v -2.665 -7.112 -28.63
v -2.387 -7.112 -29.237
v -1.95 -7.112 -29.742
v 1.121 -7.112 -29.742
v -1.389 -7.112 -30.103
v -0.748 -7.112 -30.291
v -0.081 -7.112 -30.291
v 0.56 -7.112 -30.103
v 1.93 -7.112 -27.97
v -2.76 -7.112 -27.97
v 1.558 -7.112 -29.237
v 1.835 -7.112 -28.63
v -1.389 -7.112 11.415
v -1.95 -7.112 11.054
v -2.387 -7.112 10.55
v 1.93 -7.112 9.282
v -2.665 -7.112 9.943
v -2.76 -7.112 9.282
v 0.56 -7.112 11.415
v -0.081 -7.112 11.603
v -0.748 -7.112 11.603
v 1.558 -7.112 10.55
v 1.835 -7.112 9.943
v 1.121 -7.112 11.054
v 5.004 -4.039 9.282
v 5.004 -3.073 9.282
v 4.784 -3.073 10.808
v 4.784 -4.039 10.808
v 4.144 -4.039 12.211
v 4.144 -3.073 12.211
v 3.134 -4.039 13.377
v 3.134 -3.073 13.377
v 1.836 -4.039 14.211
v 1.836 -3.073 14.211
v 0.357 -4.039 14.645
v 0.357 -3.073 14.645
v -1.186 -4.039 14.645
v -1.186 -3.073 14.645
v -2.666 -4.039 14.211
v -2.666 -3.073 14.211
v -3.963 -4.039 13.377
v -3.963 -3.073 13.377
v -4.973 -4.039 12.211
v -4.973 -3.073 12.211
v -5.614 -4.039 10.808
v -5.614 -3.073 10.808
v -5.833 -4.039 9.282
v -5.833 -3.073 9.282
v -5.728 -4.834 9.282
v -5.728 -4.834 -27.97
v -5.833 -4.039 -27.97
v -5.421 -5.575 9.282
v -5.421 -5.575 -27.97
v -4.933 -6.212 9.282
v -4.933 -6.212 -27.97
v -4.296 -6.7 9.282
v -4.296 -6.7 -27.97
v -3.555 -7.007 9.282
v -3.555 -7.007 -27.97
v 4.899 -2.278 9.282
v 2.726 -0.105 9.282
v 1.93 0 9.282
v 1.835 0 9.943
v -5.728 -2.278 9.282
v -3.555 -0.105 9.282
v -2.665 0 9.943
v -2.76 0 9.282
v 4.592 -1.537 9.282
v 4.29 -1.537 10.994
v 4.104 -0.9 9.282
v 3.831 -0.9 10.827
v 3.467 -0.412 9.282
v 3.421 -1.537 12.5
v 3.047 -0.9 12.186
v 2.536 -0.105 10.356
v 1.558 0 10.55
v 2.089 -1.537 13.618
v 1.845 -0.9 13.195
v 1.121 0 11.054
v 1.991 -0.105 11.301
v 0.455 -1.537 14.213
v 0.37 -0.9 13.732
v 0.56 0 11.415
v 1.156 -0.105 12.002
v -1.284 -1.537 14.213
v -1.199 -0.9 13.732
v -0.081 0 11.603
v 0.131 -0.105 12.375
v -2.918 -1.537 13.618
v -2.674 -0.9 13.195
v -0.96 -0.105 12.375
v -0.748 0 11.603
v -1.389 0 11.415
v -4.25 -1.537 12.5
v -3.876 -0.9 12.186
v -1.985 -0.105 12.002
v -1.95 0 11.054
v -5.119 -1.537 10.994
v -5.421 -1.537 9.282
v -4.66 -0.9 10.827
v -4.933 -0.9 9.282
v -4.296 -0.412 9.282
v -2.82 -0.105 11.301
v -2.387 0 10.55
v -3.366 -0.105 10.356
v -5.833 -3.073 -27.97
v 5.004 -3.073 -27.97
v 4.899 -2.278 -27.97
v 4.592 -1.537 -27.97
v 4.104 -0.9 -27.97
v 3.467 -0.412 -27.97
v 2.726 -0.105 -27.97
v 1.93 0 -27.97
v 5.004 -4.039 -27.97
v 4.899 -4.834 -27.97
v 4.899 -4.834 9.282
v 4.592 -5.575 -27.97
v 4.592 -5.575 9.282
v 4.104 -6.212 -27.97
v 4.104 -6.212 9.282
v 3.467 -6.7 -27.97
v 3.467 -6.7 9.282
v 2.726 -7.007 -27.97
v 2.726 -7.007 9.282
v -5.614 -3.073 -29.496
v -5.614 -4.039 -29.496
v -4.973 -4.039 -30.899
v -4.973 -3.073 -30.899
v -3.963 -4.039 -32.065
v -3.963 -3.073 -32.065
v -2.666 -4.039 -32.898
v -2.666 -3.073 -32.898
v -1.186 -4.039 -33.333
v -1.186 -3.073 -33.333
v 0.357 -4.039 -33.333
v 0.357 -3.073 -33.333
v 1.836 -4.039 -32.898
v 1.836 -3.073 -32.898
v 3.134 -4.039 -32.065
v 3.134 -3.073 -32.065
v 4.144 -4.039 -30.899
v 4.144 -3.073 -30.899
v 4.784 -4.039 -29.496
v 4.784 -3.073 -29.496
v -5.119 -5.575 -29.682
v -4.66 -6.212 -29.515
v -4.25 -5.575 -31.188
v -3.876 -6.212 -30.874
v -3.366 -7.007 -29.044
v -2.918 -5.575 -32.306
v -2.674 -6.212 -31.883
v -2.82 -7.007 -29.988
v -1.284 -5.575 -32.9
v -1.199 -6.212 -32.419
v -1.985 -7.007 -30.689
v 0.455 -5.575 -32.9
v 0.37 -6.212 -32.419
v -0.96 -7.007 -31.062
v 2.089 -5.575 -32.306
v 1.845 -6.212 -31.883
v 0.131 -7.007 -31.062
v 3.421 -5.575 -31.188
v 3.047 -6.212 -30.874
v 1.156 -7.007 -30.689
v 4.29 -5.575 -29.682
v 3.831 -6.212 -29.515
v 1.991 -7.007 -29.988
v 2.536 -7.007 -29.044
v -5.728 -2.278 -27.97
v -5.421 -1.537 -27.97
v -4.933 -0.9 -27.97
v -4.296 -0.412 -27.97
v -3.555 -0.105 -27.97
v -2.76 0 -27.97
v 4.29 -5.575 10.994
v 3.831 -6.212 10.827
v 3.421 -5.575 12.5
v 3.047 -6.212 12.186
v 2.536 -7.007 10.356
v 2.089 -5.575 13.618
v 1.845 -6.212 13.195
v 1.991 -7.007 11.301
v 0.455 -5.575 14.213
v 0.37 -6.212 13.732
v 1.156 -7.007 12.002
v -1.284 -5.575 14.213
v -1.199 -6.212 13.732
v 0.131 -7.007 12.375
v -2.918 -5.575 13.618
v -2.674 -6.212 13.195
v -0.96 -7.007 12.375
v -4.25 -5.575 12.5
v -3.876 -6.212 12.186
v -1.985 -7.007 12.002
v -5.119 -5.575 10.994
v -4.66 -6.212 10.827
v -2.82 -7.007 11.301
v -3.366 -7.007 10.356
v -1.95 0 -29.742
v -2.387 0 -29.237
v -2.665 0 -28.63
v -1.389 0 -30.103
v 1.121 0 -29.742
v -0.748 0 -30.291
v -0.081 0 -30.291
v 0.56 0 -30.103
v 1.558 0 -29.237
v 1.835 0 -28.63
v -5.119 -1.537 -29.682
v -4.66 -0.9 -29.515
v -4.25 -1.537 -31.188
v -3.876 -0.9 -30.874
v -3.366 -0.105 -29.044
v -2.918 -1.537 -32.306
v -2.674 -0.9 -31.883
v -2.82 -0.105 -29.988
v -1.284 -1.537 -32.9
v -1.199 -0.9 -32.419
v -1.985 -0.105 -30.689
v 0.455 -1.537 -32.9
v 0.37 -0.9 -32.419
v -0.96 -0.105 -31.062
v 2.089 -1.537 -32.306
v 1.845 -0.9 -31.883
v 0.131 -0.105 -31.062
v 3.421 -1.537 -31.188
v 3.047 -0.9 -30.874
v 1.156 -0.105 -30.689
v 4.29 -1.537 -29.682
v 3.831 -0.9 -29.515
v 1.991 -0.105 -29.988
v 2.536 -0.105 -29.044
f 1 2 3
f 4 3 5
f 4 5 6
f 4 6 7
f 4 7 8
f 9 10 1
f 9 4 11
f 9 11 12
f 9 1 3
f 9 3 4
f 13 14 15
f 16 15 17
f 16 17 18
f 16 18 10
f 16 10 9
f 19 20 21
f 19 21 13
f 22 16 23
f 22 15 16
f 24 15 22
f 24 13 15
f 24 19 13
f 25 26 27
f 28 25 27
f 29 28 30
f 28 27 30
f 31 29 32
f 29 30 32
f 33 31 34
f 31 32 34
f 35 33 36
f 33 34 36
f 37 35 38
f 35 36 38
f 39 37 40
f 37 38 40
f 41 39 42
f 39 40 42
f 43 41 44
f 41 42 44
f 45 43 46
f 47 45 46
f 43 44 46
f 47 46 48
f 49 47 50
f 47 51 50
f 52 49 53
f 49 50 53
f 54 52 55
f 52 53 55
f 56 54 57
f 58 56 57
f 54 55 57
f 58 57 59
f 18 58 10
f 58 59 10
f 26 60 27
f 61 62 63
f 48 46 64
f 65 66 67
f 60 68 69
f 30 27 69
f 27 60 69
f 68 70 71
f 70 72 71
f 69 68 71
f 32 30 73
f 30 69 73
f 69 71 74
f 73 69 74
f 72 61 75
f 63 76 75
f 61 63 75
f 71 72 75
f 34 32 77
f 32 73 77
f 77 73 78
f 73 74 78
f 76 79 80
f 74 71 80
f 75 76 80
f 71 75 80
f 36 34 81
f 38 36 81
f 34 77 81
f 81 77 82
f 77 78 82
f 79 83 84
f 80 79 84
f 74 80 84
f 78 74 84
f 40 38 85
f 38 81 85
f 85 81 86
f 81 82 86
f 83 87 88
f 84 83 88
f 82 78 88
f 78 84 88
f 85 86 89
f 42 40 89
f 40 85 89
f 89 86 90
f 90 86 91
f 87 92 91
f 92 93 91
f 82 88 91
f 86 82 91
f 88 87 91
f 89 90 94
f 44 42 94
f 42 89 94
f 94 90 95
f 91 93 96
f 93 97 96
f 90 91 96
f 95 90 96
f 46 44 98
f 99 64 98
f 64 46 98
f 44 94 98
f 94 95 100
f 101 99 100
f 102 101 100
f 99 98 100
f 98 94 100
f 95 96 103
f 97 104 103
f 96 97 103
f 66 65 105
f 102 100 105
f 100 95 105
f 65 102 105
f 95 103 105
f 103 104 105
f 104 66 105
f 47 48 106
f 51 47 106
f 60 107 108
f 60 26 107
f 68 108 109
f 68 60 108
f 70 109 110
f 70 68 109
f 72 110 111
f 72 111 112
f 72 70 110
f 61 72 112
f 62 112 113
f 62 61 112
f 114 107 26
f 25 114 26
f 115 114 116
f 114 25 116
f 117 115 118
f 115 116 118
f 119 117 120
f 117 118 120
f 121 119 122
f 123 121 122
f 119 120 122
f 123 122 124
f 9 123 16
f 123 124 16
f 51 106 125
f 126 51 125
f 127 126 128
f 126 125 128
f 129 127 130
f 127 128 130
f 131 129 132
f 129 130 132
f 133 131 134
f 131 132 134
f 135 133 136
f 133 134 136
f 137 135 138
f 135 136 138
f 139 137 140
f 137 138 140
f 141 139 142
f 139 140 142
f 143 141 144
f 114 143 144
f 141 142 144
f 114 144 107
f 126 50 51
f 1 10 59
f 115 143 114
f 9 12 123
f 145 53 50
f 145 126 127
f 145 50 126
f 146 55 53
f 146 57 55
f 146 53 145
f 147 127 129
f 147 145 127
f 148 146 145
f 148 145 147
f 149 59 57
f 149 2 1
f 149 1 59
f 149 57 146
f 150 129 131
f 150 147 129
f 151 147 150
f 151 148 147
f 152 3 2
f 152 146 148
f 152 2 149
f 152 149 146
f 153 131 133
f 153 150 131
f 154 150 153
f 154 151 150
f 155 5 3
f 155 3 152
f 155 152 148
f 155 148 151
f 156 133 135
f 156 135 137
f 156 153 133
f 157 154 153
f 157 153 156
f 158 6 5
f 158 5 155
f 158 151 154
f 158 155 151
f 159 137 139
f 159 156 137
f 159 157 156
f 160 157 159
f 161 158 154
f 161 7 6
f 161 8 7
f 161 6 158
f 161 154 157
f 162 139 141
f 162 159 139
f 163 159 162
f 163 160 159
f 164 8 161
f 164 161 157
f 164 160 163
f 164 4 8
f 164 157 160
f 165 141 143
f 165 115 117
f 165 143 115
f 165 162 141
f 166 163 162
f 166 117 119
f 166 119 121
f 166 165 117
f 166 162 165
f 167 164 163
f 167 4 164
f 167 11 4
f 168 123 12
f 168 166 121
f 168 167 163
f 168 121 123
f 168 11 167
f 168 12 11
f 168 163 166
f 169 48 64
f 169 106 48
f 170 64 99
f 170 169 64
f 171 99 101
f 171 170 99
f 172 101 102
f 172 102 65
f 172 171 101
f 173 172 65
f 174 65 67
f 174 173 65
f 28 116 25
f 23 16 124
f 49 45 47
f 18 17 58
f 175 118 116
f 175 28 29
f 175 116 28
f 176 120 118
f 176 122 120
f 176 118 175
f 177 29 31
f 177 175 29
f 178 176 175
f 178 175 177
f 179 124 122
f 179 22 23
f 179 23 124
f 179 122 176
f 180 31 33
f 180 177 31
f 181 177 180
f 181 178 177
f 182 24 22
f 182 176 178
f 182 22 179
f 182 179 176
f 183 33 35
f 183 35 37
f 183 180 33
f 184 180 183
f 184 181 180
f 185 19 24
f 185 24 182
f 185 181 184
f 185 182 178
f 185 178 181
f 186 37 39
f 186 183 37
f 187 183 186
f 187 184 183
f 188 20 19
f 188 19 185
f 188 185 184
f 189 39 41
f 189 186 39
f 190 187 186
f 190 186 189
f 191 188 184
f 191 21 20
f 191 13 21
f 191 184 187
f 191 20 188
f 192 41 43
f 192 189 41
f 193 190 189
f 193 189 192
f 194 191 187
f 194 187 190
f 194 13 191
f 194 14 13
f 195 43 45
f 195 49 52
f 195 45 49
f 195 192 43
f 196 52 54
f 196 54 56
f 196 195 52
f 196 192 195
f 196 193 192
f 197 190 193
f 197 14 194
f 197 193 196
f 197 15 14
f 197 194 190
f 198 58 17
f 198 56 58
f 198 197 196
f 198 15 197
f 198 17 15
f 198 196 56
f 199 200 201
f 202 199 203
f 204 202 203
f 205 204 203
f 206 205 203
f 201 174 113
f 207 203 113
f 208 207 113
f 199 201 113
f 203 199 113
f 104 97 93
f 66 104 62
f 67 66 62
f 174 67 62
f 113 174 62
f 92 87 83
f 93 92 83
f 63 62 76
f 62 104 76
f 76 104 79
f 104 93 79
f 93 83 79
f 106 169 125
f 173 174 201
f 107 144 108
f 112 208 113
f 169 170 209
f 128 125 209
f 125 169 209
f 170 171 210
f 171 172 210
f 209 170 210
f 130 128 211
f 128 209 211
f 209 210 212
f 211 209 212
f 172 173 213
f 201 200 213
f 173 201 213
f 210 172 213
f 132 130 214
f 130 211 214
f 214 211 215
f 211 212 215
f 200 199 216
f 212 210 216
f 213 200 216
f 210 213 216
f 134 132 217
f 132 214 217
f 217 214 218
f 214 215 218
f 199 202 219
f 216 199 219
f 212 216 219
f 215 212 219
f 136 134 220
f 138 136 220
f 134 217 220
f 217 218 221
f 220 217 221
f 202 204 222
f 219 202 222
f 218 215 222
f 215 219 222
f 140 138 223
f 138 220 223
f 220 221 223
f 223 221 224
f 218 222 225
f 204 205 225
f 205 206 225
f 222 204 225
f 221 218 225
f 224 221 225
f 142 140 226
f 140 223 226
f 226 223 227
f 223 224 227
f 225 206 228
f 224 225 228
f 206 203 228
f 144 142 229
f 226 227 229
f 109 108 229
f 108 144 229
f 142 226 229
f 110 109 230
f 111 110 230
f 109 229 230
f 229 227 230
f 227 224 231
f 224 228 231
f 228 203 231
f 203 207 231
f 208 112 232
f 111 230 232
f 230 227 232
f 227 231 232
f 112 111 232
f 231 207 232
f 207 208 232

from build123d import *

# Parameters (mm, degrees)
F1_DEPTH = 7.112
F2_R     = 3.0734


with BuildPart() as f1:
    # F0 (on Front) → F1 (new body)
    with BuildSketch(Plane.XZ):
        with BuildLine():
            Line((-5.833062, 5.073665), (-5.833062, -2.089096))
            ThreePointArc((-5.833062, -2.089096), (-0.414611, 3.329354), (5.003839, -2.089096))
            Line((5.003839, -2.089096), (5.003839, 1.10841))
            Line((5.003839, 1.10841), (5.003839, 9.281913))
            ThreePointArc((5.003839, 9.281913), (-0.414611, 14.700363), (-5.833062, 9.281913))
            Line((-5.833062, 9.281913), (-5.833062, 5.073665))
        make_face()
        with BuildLine():
            Line((5.003839, -2.089096), (-5.833062, -2.089096))
            ThreePointArc((-5.833062, -2.089096), (-0.414611, -7.507547), (5.003839, -2.089096))
        make_face()
        with BuildLine():
            ThreePointArc((5.003839, -2.089096), (-0.414611, 3.329354), (-5.833062, -2.089096))
            Line((-5.833062, -2.089096), (5.003839, -2.089096))
        make_face()
        with BuildLine():
            Line((-5.833062, -2.089096), (-5.833062, -27.969601))
            ThreePointArc((-5.833062, -27.969601), (-0.414611, -33.388051), (5.003839, -27.969601))
            Line((5.003839, -27.969601), (5.003839, -9.071903))
            Line((5.003839, -9.071903), (5.003839, -2.089096))
            ThreePointArc((5.003839, -2.089096), (-0.414611, -7.507547), (-5.833062, -2.089096))
        make_face()
    extrude(amount=F1_DEPTH)

    # F2
    f2_edges = [f1.edges().sort_by_distance(p)[0] for p in [
        (5.003839, -7.112, -9.343844),
        (5.003839, 0, -9.343844),
        (-0.414611, -7.112, 14.700363),
        (-0.414611, 0, 14.700363),
        (-0.414611, 0, -33.388051),
        (-0.414611, -7.112, -33.388051),
        (-5.833062, 0, -9.343844),
        (-5.833062, -7.112, -9.343844),
    ]]
    fillet(f2_edges, radius=F2_R)


solid = f1.part
